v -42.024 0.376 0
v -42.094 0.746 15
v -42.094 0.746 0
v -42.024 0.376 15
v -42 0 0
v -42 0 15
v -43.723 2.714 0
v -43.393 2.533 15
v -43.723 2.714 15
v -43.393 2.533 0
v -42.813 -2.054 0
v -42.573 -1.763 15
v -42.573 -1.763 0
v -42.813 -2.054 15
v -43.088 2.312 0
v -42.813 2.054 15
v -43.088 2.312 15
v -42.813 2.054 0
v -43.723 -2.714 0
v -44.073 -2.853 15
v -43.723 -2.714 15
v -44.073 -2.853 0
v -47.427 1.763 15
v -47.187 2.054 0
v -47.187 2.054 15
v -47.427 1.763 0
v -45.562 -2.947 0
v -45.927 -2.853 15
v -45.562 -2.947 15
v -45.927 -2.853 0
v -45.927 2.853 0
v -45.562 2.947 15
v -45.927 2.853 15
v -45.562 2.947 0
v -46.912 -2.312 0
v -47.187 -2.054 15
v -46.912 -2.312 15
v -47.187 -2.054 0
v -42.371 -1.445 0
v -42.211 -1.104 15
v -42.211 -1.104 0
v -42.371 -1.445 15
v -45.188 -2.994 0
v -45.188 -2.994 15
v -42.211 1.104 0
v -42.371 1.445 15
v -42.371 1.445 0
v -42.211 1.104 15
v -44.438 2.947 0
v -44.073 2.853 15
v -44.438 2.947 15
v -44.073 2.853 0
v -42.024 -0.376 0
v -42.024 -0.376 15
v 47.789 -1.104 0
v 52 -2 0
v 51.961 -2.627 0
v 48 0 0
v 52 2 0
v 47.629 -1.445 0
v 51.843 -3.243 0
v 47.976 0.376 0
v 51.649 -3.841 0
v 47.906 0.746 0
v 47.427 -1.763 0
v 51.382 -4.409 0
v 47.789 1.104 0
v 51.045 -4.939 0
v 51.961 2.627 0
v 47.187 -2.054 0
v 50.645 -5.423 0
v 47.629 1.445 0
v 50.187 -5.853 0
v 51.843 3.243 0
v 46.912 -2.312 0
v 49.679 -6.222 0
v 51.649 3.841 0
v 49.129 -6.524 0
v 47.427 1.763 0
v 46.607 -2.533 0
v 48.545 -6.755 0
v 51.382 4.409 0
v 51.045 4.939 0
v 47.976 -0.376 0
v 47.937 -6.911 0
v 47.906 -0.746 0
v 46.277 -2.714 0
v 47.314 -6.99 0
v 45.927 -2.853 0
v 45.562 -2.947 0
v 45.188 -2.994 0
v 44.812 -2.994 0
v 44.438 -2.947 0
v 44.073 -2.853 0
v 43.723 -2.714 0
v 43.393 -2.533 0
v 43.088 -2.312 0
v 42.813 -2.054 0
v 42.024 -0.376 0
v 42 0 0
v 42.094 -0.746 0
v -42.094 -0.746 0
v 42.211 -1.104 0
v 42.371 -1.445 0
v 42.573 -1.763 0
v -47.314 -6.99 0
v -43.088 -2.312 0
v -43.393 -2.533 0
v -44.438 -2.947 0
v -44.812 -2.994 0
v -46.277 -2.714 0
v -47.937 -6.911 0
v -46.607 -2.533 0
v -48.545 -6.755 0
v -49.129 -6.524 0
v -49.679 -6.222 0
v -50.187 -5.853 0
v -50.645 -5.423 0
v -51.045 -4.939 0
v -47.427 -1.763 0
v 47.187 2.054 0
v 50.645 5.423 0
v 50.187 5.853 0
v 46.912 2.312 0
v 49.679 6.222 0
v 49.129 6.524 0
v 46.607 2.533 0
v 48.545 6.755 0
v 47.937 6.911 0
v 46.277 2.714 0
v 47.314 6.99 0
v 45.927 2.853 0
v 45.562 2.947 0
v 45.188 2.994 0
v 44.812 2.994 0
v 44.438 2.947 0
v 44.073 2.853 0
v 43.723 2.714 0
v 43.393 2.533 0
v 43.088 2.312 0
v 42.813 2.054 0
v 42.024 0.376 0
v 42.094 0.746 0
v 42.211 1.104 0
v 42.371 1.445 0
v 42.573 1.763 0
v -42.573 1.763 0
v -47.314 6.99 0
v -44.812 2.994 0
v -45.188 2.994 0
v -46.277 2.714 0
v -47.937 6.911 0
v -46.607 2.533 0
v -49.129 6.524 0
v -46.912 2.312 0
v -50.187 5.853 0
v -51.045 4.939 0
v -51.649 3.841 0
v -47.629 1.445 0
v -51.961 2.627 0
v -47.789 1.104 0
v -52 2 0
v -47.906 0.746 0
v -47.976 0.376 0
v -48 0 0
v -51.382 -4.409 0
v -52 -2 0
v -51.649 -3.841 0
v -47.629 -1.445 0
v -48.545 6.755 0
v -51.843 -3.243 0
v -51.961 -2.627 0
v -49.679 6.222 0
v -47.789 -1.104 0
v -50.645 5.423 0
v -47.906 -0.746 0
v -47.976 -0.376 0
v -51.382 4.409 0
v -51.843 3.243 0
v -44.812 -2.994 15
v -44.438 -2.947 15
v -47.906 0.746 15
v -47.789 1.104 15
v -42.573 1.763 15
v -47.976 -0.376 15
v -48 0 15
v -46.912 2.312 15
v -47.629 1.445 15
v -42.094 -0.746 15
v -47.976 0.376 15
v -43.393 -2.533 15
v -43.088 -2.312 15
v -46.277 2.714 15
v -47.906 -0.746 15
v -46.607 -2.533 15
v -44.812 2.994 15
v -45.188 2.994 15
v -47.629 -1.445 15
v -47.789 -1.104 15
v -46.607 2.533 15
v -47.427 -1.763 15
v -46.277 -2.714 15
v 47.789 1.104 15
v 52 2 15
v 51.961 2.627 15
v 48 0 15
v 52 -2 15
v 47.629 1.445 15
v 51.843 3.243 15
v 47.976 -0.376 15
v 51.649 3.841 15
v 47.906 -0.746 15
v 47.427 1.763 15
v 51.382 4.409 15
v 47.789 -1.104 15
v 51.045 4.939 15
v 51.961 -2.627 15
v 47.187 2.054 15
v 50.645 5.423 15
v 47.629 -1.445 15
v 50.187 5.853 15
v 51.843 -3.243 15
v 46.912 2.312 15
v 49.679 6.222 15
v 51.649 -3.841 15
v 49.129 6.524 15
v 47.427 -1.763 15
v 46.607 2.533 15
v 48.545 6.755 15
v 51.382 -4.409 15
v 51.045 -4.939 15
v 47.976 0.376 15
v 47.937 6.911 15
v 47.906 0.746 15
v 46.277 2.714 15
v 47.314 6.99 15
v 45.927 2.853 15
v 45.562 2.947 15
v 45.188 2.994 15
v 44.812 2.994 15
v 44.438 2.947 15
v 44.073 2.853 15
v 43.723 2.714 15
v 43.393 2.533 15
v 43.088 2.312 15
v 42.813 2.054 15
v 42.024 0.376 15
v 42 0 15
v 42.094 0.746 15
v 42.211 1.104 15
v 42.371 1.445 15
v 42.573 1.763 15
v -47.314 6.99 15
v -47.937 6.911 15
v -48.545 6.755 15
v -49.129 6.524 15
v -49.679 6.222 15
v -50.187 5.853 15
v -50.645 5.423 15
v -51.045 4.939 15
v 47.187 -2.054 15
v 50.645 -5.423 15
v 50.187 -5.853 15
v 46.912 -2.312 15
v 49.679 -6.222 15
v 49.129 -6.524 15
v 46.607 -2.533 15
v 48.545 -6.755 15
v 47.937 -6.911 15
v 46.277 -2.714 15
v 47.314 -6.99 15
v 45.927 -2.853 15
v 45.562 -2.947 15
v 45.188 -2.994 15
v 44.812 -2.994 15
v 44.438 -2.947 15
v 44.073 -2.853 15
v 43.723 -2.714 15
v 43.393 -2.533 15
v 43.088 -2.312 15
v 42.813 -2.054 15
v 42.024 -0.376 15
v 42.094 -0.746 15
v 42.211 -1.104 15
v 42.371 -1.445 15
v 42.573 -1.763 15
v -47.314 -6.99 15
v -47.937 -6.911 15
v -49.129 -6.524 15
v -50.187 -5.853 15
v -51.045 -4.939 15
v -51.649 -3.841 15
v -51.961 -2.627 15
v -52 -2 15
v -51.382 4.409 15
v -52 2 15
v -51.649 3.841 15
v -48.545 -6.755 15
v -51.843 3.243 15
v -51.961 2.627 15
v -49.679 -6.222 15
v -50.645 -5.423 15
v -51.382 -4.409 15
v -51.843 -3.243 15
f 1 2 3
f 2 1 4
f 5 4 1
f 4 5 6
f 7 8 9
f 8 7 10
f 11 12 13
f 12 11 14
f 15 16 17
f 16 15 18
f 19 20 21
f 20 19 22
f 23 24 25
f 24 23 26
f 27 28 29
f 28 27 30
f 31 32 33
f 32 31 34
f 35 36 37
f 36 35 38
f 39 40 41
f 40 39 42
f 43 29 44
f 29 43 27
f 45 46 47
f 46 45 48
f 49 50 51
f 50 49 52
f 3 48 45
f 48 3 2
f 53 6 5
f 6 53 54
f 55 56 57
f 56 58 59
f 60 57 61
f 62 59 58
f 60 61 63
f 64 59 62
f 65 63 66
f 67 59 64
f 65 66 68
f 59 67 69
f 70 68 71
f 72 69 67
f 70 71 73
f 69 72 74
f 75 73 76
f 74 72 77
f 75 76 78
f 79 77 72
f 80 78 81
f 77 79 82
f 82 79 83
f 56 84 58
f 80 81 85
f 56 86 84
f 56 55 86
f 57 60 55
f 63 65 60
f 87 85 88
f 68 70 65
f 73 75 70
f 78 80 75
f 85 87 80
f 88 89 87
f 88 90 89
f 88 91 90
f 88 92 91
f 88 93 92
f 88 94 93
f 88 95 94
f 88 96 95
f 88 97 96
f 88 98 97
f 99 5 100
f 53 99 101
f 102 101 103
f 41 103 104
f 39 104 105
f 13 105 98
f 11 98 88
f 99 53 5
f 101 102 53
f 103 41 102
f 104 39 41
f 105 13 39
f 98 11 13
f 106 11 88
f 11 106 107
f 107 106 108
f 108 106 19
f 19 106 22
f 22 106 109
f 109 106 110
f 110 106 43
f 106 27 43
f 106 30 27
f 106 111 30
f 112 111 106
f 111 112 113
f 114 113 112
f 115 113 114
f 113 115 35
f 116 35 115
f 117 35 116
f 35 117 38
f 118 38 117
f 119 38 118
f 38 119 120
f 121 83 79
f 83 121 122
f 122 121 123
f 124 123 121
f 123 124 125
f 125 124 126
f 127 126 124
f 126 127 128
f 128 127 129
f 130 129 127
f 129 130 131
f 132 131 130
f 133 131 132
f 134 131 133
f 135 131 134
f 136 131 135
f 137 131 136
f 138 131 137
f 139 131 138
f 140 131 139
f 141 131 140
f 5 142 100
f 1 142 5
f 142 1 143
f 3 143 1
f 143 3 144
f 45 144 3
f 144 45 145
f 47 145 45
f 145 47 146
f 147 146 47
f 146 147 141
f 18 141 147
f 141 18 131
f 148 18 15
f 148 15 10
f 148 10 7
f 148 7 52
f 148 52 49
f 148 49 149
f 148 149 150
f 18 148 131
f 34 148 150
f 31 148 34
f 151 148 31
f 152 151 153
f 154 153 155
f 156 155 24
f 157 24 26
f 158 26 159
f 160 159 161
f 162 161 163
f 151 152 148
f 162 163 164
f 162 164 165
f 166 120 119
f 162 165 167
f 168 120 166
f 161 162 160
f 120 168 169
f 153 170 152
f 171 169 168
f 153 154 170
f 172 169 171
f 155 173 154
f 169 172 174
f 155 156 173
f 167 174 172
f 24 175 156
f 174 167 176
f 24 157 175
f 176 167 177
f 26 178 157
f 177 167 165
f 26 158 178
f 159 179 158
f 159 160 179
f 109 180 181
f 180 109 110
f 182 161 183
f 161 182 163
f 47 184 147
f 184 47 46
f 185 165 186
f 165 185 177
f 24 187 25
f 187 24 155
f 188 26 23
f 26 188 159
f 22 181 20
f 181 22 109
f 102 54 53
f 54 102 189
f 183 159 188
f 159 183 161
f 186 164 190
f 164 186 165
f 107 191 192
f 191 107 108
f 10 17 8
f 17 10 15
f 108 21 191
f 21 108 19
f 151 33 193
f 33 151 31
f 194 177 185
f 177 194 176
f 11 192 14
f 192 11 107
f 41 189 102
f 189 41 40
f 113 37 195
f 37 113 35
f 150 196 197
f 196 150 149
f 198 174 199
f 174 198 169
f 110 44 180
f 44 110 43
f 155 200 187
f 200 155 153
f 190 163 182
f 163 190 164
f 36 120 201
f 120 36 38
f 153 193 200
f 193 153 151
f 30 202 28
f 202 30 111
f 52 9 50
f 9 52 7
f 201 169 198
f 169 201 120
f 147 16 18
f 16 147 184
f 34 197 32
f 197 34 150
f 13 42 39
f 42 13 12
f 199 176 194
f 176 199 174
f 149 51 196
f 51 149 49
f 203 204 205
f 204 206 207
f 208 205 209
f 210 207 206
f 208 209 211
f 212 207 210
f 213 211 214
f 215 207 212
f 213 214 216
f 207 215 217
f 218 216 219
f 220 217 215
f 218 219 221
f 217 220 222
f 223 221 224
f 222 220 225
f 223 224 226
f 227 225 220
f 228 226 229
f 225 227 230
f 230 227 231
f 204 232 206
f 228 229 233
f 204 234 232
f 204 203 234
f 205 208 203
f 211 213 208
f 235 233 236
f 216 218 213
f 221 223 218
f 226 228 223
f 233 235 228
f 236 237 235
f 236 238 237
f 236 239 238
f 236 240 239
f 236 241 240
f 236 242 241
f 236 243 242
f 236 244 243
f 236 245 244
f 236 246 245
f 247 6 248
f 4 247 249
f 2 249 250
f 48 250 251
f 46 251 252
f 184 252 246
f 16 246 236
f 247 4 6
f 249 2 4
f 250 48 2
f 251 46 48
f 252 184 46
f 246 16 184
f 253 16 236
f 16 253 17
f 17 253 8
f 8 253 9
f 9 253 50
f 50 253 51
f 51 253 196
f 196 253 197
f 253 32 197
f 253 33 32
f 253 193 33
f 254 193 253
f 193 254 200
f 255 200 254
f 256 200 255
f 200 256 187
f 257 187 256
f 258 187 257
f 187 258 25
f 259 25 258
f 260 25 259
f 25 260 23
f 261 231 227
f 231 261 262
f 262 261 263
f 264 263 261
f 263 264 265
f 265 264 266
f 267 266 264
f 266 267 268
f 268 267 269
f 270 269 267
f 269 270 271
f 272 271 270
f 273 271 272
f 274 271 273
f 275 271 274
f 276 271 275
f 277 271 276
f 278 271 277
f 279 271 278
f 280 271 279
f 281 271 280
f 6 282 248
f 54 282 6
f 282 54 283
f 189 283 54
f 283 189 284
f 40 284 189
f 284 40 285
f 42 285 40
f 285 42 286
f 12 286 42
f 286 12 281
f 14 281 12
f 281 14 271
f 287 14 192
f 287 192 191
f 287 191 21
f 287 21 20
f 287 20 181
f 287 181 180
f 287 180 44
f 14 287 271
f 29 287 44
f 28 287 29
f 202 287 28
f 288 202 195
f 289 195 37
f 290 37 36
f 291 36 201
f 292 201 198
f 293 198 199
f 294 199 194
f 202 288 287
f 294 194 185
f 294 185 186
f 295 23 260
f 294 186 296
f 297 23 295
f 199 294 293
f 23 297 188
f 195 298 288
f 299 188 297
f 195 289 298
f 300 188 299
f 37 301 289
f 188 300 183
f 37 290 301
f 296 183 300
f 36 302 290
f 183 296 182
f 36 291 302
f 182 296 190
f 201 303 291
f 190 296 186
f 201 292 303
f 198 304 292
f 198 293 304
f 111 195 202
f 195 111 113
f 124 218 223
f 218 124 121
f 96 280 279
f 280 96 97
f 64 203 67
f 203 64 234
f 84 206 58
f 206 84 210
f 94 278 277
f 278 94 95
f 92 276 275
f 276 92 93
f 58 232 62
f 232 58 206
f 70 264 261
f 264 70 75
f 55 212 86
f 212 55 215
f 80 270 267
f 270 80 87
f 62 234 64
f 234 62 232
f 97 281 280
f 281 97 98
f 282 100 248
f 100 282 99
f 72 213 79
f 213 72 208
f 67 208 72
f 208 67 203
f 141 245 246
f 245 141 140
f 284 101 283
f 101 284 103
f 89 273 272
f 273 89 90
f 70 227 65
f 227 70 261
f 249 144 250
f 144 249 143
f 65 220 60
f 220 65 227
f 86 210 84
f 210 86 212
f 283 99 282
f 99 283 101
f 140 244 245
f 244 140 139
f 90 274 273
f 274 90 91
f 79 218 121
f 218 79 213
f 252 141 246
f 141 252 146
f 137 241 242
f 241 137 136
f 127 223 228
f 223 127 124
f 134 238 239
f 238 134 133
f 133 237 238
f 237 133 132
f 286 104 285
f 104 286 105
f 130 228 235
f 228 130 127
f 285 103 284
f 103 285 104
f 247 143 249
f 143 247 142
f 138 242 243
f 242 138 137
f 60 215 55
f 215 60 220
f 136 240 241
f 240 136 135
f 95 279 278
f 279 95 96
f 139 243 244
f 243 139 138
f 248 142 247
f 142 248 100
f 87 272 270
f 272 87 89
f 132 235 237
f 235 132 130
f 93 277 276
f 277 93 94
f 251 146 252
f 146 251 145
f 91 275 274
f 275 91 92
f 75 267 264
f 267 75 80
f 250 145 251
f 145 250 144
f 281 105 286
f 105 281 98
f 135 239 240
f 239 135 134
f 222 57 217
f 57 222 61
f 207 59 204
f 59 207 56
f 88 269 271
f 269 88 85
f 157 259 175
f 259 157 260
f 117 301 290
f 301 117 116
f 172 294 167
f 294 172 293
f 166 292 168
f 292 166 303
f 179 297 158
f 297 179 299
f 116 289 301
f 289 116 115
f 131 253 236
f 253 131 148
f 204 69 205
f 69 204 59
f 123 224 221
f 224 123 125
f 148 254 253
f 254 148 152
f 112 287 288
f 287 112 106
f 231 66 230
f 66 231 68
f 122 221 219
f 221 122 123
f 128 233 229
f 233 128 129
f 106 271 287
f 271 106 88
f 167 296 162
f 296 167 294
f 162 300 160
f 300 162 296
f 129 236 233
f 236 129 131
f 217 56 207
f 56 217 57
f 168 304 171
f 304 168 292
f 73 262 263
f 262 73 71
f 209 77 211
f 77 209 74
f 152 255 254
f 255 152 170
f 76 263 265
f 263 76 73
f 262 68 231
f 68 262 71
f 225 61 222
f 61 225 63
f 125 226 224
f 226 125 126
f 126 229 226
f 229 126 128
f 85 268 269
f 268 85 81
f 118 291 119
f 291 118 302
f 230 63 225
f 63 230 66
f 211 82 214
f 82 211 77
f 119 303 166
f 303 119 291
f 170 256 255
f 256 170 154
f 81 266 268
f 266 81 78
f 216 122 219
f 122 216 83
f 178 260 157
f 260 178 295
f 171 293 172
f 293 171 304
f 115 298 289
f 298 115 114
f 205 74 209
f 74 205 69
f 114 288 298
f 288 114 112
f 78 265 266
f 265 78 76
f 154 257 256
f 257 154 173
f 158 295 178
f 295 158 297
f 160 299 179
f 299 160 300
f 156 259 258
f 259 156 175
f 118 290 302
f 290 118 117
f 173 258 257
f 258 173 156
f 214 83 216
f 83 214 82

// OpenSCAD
$fn = 50;


difference() {
	union() {
		hull() {
			translate(v = [-47.0000000000, 2.0000000000, 0]) {
				cylinder(h = 15, r = 5);
			}
			translate(v = [47.0000000000, 2.0000000000, 0]) {
				cylinder(h = 15, r = 5);
			}
			translate(v = [-47.0000000000, -2.0000000000, 0]) {
				cylinder(h = 15, r = 5);
			}
			translate(v = [47.0000000000, -2.0000000000, 0]) {
				cylinder(h = 15, r = 5);
			}
		}
	}
	union() {
		translate(v = [-45.0000000000, 0.0000000000, 0]) {
			cylinder(h = 15, r = 3.0000000000);
		}
		translate(v = [45.0000000000, 0.0000000000, 0]) {
			cylinder(h = 15, r = 3.0000000000);
		}
		translate(v = [-45.0000000000, 0.0000000000, 0]) {
			cylinder(h = 15, r = 1.5000000000);
		}
		translate(v = [45.0000000000, 0.0000000000, 0]) {
			cylinder(h = 15, r = 1.5000000000);
		}
		translate(v = [-45.0000000000, 0.0000000000, 0]) {
			cylinder(h = 15, r = 1.5000000000);
		}
		translate(v = [45.0000000000, 0.0000000000, 0]) {
			cylinder(h = 15, r = 1.5000000000);
		}
		translate(v = [-45.0000000000, 0.0000000000, 0]) {
			cylinder(h = 15, r = 1.5000000000);
		}
		translate(v = [45.0000000000, 0.0000000000, 0]) {
			cylinder(h = 15, r = 1.5000000000);
		}
	}
}
